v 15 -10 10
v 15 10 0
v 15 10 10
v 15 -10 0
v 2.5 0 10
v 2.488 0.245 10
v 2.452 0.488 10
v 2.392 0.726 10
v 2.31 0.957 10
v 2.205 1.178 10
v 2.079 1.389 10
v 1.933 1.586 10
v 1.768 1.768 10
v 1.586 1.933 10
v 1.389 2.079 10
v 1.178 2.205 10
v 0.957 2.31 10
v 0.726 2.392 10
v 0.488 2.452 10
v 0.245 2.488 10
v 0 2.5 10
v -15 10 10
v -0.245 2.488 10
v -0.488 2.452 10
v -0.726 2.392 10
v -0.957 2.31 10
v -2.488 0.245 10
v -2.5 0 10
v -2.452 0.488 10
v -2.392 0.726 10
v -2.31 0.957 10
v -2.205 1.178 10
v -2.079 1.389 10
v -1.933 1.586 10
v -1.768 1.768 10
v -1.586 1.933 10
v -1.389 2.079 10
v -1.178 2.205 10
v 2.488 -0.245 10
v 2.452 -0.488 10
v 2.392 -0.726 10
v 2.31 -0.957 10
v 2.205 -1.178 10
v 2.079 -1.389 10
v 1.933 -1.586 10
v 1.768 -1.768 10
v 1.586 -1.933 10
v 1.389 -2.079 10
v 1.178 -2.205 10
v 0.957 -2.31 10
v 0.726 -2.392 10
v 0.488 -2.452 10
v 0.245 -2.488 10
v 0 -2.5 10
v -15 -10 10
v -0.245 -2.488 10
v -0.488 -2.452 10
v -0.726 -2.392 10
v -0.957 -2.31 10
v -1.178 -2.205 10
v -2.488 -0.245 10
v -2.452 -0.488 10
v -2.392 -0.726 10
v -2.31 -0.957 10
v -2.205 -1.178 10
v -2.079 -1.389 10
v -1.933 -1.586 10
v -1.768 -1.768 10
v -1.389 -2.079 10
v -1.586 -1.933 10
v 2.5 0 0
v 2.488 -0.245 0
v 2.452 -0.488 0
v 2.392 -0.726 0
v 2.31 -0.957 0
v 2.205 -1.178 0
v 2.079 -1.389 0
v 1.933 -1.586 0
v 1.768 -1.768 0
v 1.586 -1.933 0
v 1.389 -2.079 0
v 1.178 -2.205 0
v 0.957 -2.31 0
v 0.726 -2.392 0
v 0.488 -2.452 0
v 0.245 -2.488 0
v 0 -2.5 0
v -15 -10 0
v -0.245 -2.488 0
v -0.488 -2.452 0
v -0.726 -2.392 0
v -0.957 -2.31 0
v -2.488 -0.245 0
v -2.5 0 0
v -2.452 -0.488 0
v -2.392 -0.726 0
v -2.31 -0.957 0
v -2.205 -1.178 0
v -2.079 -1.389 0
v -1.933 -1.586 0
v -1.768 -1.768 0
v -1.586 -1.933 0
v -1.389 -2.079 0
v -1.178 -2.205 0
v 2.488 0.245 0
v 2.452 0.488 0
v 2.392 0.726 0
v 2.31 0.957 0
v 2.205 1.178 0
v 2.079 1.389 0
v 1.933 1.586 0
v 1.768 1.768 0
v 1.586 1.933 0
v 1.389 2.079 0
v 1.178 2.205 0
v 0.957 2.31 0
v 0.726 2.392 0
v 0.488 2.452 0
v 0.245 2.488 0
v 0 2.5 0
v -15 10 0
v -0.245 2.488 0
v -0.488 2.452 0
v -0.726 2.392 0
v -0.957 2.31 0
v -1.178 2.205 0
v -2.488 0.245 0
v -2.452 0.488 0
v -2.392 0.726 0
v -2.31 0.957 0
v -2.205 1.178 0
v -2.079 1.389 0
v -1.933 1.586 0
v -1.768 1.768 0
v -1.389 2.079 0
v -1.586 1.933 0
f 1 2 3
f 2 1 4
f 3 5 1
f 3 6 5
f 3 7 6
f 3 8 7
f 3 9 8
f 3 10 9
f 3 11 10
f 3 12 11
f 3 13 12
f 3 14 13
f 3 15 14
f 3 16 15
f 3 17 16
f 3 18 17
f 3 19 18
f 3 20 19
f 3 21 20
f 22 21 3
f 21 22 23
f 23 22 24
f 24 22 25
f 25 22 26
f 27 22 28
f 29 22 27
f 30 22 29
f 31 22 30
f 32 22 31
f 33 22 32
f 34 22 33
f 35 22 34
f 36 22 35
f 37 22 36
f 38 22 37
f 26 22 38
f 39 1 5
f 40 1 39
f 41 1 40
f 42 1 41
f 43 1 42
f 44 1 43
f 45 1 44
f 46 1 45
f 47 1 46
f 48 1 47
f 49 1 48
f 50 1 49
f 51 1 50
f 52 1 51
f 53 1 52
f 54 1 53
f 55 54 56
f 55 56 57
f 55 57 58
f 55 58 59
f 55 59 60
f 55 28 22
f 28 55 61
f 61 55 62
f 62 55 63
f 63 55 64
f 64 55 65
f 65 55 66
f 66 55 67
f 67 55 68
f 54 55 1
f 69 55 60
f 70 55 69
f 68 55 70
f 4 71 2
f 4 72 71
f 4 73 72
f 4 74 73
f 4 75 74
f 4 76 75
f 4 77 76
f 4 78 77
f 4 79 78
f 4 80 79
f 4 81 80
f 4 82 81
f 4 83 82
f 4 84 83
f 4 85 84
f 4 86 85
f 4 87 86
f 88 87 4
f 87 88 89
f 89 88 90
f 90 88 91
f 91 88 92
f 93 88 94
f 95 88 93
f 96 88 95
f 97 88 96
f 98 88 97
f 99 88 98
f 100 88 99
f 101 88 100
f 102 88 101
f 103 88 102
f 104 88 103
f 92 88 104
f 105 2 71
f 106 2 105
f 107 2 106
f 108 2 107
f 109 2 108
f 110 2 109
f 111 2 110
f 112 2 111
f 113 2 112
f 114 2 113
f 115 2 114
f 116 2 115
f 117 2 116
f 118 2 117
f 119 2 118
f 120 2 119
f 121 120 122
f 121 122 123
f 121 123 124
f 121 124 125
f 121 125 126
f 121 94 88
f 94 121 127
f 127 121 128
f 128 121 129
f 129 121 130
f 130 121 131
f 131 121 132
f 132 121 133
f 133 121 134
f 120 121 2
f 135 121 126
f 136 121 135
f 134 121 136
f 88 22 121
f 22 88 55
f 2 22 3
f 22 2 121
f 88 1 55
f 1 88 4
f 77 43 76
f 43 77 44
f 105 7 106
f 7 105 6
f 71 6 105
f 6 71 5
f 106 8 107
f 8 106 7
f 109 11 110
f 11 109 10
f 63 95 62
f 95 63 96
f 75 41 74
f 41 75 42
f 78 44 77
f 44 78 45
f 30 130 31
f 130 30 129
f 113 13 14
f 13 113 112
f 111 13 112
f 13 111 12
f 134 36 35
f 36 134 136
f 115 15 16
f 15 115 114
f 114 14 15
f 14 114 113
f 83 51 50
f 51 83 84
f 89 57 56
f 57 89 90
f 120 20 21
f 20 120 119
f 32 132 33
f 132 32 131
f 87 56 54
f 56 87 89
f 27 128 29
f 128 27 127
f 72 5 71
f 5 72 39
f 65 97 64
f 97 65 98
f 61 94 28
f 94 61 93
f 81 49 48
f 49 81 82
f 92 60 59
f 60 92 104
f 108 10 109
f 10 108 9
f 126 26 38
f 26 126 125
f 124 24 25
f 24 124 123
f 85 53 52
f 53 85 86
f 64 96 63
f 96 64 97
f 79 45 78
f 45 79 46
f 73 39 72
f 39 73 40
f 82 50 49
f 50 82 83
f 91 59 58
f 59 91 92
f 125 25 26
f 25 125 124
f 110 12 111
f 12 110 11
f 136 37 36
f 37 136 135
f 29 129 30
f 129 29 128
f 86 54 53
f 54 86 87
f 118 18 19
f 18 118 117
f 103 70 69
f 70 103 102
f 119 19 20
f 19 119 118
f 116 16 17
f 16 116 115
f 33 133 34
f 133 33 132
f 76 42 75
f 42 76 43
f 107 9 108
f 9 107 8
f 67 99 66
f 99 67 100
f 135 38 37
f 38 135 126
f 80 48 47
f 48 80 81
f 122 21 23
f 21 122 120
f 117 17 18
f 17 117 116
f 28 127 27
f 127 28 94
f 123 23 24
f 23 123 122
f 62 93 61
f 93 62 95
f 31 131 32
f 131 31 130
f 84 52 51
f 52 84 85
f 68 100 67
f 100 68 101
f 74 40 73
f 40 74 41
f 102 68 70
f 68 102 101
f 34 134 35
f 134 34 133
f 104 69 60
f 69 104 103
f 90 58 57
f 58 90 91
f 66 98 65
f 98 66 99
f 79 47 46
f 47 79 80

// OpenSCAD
// Units: mm. Right-handed, Z up; origin at the centre of the bottom face.
// FDM example: flat bottom on the bed; no fit compensation implied.
width_x = 30;
depth_y = 20;
height_z = 10;
hole_d = 5;
hole_fn = 64;
eps = 0.01;

assert(width_x > hole_d && depth_y > hole_d && hole_d > 0);
assert(height_z > 0 && eps > 0 && hole_fn >= 12);

module part() {
    difference() {
        translate([-width_x/2, -depth_y/2, 0])
            cube([width_x, depth_y, height_z]);
        translate([0, 0, -eps])
            cylinder(d=hole_d, h=height_z + 2*eps, $fn=hole_fn);
    }
}

part();
